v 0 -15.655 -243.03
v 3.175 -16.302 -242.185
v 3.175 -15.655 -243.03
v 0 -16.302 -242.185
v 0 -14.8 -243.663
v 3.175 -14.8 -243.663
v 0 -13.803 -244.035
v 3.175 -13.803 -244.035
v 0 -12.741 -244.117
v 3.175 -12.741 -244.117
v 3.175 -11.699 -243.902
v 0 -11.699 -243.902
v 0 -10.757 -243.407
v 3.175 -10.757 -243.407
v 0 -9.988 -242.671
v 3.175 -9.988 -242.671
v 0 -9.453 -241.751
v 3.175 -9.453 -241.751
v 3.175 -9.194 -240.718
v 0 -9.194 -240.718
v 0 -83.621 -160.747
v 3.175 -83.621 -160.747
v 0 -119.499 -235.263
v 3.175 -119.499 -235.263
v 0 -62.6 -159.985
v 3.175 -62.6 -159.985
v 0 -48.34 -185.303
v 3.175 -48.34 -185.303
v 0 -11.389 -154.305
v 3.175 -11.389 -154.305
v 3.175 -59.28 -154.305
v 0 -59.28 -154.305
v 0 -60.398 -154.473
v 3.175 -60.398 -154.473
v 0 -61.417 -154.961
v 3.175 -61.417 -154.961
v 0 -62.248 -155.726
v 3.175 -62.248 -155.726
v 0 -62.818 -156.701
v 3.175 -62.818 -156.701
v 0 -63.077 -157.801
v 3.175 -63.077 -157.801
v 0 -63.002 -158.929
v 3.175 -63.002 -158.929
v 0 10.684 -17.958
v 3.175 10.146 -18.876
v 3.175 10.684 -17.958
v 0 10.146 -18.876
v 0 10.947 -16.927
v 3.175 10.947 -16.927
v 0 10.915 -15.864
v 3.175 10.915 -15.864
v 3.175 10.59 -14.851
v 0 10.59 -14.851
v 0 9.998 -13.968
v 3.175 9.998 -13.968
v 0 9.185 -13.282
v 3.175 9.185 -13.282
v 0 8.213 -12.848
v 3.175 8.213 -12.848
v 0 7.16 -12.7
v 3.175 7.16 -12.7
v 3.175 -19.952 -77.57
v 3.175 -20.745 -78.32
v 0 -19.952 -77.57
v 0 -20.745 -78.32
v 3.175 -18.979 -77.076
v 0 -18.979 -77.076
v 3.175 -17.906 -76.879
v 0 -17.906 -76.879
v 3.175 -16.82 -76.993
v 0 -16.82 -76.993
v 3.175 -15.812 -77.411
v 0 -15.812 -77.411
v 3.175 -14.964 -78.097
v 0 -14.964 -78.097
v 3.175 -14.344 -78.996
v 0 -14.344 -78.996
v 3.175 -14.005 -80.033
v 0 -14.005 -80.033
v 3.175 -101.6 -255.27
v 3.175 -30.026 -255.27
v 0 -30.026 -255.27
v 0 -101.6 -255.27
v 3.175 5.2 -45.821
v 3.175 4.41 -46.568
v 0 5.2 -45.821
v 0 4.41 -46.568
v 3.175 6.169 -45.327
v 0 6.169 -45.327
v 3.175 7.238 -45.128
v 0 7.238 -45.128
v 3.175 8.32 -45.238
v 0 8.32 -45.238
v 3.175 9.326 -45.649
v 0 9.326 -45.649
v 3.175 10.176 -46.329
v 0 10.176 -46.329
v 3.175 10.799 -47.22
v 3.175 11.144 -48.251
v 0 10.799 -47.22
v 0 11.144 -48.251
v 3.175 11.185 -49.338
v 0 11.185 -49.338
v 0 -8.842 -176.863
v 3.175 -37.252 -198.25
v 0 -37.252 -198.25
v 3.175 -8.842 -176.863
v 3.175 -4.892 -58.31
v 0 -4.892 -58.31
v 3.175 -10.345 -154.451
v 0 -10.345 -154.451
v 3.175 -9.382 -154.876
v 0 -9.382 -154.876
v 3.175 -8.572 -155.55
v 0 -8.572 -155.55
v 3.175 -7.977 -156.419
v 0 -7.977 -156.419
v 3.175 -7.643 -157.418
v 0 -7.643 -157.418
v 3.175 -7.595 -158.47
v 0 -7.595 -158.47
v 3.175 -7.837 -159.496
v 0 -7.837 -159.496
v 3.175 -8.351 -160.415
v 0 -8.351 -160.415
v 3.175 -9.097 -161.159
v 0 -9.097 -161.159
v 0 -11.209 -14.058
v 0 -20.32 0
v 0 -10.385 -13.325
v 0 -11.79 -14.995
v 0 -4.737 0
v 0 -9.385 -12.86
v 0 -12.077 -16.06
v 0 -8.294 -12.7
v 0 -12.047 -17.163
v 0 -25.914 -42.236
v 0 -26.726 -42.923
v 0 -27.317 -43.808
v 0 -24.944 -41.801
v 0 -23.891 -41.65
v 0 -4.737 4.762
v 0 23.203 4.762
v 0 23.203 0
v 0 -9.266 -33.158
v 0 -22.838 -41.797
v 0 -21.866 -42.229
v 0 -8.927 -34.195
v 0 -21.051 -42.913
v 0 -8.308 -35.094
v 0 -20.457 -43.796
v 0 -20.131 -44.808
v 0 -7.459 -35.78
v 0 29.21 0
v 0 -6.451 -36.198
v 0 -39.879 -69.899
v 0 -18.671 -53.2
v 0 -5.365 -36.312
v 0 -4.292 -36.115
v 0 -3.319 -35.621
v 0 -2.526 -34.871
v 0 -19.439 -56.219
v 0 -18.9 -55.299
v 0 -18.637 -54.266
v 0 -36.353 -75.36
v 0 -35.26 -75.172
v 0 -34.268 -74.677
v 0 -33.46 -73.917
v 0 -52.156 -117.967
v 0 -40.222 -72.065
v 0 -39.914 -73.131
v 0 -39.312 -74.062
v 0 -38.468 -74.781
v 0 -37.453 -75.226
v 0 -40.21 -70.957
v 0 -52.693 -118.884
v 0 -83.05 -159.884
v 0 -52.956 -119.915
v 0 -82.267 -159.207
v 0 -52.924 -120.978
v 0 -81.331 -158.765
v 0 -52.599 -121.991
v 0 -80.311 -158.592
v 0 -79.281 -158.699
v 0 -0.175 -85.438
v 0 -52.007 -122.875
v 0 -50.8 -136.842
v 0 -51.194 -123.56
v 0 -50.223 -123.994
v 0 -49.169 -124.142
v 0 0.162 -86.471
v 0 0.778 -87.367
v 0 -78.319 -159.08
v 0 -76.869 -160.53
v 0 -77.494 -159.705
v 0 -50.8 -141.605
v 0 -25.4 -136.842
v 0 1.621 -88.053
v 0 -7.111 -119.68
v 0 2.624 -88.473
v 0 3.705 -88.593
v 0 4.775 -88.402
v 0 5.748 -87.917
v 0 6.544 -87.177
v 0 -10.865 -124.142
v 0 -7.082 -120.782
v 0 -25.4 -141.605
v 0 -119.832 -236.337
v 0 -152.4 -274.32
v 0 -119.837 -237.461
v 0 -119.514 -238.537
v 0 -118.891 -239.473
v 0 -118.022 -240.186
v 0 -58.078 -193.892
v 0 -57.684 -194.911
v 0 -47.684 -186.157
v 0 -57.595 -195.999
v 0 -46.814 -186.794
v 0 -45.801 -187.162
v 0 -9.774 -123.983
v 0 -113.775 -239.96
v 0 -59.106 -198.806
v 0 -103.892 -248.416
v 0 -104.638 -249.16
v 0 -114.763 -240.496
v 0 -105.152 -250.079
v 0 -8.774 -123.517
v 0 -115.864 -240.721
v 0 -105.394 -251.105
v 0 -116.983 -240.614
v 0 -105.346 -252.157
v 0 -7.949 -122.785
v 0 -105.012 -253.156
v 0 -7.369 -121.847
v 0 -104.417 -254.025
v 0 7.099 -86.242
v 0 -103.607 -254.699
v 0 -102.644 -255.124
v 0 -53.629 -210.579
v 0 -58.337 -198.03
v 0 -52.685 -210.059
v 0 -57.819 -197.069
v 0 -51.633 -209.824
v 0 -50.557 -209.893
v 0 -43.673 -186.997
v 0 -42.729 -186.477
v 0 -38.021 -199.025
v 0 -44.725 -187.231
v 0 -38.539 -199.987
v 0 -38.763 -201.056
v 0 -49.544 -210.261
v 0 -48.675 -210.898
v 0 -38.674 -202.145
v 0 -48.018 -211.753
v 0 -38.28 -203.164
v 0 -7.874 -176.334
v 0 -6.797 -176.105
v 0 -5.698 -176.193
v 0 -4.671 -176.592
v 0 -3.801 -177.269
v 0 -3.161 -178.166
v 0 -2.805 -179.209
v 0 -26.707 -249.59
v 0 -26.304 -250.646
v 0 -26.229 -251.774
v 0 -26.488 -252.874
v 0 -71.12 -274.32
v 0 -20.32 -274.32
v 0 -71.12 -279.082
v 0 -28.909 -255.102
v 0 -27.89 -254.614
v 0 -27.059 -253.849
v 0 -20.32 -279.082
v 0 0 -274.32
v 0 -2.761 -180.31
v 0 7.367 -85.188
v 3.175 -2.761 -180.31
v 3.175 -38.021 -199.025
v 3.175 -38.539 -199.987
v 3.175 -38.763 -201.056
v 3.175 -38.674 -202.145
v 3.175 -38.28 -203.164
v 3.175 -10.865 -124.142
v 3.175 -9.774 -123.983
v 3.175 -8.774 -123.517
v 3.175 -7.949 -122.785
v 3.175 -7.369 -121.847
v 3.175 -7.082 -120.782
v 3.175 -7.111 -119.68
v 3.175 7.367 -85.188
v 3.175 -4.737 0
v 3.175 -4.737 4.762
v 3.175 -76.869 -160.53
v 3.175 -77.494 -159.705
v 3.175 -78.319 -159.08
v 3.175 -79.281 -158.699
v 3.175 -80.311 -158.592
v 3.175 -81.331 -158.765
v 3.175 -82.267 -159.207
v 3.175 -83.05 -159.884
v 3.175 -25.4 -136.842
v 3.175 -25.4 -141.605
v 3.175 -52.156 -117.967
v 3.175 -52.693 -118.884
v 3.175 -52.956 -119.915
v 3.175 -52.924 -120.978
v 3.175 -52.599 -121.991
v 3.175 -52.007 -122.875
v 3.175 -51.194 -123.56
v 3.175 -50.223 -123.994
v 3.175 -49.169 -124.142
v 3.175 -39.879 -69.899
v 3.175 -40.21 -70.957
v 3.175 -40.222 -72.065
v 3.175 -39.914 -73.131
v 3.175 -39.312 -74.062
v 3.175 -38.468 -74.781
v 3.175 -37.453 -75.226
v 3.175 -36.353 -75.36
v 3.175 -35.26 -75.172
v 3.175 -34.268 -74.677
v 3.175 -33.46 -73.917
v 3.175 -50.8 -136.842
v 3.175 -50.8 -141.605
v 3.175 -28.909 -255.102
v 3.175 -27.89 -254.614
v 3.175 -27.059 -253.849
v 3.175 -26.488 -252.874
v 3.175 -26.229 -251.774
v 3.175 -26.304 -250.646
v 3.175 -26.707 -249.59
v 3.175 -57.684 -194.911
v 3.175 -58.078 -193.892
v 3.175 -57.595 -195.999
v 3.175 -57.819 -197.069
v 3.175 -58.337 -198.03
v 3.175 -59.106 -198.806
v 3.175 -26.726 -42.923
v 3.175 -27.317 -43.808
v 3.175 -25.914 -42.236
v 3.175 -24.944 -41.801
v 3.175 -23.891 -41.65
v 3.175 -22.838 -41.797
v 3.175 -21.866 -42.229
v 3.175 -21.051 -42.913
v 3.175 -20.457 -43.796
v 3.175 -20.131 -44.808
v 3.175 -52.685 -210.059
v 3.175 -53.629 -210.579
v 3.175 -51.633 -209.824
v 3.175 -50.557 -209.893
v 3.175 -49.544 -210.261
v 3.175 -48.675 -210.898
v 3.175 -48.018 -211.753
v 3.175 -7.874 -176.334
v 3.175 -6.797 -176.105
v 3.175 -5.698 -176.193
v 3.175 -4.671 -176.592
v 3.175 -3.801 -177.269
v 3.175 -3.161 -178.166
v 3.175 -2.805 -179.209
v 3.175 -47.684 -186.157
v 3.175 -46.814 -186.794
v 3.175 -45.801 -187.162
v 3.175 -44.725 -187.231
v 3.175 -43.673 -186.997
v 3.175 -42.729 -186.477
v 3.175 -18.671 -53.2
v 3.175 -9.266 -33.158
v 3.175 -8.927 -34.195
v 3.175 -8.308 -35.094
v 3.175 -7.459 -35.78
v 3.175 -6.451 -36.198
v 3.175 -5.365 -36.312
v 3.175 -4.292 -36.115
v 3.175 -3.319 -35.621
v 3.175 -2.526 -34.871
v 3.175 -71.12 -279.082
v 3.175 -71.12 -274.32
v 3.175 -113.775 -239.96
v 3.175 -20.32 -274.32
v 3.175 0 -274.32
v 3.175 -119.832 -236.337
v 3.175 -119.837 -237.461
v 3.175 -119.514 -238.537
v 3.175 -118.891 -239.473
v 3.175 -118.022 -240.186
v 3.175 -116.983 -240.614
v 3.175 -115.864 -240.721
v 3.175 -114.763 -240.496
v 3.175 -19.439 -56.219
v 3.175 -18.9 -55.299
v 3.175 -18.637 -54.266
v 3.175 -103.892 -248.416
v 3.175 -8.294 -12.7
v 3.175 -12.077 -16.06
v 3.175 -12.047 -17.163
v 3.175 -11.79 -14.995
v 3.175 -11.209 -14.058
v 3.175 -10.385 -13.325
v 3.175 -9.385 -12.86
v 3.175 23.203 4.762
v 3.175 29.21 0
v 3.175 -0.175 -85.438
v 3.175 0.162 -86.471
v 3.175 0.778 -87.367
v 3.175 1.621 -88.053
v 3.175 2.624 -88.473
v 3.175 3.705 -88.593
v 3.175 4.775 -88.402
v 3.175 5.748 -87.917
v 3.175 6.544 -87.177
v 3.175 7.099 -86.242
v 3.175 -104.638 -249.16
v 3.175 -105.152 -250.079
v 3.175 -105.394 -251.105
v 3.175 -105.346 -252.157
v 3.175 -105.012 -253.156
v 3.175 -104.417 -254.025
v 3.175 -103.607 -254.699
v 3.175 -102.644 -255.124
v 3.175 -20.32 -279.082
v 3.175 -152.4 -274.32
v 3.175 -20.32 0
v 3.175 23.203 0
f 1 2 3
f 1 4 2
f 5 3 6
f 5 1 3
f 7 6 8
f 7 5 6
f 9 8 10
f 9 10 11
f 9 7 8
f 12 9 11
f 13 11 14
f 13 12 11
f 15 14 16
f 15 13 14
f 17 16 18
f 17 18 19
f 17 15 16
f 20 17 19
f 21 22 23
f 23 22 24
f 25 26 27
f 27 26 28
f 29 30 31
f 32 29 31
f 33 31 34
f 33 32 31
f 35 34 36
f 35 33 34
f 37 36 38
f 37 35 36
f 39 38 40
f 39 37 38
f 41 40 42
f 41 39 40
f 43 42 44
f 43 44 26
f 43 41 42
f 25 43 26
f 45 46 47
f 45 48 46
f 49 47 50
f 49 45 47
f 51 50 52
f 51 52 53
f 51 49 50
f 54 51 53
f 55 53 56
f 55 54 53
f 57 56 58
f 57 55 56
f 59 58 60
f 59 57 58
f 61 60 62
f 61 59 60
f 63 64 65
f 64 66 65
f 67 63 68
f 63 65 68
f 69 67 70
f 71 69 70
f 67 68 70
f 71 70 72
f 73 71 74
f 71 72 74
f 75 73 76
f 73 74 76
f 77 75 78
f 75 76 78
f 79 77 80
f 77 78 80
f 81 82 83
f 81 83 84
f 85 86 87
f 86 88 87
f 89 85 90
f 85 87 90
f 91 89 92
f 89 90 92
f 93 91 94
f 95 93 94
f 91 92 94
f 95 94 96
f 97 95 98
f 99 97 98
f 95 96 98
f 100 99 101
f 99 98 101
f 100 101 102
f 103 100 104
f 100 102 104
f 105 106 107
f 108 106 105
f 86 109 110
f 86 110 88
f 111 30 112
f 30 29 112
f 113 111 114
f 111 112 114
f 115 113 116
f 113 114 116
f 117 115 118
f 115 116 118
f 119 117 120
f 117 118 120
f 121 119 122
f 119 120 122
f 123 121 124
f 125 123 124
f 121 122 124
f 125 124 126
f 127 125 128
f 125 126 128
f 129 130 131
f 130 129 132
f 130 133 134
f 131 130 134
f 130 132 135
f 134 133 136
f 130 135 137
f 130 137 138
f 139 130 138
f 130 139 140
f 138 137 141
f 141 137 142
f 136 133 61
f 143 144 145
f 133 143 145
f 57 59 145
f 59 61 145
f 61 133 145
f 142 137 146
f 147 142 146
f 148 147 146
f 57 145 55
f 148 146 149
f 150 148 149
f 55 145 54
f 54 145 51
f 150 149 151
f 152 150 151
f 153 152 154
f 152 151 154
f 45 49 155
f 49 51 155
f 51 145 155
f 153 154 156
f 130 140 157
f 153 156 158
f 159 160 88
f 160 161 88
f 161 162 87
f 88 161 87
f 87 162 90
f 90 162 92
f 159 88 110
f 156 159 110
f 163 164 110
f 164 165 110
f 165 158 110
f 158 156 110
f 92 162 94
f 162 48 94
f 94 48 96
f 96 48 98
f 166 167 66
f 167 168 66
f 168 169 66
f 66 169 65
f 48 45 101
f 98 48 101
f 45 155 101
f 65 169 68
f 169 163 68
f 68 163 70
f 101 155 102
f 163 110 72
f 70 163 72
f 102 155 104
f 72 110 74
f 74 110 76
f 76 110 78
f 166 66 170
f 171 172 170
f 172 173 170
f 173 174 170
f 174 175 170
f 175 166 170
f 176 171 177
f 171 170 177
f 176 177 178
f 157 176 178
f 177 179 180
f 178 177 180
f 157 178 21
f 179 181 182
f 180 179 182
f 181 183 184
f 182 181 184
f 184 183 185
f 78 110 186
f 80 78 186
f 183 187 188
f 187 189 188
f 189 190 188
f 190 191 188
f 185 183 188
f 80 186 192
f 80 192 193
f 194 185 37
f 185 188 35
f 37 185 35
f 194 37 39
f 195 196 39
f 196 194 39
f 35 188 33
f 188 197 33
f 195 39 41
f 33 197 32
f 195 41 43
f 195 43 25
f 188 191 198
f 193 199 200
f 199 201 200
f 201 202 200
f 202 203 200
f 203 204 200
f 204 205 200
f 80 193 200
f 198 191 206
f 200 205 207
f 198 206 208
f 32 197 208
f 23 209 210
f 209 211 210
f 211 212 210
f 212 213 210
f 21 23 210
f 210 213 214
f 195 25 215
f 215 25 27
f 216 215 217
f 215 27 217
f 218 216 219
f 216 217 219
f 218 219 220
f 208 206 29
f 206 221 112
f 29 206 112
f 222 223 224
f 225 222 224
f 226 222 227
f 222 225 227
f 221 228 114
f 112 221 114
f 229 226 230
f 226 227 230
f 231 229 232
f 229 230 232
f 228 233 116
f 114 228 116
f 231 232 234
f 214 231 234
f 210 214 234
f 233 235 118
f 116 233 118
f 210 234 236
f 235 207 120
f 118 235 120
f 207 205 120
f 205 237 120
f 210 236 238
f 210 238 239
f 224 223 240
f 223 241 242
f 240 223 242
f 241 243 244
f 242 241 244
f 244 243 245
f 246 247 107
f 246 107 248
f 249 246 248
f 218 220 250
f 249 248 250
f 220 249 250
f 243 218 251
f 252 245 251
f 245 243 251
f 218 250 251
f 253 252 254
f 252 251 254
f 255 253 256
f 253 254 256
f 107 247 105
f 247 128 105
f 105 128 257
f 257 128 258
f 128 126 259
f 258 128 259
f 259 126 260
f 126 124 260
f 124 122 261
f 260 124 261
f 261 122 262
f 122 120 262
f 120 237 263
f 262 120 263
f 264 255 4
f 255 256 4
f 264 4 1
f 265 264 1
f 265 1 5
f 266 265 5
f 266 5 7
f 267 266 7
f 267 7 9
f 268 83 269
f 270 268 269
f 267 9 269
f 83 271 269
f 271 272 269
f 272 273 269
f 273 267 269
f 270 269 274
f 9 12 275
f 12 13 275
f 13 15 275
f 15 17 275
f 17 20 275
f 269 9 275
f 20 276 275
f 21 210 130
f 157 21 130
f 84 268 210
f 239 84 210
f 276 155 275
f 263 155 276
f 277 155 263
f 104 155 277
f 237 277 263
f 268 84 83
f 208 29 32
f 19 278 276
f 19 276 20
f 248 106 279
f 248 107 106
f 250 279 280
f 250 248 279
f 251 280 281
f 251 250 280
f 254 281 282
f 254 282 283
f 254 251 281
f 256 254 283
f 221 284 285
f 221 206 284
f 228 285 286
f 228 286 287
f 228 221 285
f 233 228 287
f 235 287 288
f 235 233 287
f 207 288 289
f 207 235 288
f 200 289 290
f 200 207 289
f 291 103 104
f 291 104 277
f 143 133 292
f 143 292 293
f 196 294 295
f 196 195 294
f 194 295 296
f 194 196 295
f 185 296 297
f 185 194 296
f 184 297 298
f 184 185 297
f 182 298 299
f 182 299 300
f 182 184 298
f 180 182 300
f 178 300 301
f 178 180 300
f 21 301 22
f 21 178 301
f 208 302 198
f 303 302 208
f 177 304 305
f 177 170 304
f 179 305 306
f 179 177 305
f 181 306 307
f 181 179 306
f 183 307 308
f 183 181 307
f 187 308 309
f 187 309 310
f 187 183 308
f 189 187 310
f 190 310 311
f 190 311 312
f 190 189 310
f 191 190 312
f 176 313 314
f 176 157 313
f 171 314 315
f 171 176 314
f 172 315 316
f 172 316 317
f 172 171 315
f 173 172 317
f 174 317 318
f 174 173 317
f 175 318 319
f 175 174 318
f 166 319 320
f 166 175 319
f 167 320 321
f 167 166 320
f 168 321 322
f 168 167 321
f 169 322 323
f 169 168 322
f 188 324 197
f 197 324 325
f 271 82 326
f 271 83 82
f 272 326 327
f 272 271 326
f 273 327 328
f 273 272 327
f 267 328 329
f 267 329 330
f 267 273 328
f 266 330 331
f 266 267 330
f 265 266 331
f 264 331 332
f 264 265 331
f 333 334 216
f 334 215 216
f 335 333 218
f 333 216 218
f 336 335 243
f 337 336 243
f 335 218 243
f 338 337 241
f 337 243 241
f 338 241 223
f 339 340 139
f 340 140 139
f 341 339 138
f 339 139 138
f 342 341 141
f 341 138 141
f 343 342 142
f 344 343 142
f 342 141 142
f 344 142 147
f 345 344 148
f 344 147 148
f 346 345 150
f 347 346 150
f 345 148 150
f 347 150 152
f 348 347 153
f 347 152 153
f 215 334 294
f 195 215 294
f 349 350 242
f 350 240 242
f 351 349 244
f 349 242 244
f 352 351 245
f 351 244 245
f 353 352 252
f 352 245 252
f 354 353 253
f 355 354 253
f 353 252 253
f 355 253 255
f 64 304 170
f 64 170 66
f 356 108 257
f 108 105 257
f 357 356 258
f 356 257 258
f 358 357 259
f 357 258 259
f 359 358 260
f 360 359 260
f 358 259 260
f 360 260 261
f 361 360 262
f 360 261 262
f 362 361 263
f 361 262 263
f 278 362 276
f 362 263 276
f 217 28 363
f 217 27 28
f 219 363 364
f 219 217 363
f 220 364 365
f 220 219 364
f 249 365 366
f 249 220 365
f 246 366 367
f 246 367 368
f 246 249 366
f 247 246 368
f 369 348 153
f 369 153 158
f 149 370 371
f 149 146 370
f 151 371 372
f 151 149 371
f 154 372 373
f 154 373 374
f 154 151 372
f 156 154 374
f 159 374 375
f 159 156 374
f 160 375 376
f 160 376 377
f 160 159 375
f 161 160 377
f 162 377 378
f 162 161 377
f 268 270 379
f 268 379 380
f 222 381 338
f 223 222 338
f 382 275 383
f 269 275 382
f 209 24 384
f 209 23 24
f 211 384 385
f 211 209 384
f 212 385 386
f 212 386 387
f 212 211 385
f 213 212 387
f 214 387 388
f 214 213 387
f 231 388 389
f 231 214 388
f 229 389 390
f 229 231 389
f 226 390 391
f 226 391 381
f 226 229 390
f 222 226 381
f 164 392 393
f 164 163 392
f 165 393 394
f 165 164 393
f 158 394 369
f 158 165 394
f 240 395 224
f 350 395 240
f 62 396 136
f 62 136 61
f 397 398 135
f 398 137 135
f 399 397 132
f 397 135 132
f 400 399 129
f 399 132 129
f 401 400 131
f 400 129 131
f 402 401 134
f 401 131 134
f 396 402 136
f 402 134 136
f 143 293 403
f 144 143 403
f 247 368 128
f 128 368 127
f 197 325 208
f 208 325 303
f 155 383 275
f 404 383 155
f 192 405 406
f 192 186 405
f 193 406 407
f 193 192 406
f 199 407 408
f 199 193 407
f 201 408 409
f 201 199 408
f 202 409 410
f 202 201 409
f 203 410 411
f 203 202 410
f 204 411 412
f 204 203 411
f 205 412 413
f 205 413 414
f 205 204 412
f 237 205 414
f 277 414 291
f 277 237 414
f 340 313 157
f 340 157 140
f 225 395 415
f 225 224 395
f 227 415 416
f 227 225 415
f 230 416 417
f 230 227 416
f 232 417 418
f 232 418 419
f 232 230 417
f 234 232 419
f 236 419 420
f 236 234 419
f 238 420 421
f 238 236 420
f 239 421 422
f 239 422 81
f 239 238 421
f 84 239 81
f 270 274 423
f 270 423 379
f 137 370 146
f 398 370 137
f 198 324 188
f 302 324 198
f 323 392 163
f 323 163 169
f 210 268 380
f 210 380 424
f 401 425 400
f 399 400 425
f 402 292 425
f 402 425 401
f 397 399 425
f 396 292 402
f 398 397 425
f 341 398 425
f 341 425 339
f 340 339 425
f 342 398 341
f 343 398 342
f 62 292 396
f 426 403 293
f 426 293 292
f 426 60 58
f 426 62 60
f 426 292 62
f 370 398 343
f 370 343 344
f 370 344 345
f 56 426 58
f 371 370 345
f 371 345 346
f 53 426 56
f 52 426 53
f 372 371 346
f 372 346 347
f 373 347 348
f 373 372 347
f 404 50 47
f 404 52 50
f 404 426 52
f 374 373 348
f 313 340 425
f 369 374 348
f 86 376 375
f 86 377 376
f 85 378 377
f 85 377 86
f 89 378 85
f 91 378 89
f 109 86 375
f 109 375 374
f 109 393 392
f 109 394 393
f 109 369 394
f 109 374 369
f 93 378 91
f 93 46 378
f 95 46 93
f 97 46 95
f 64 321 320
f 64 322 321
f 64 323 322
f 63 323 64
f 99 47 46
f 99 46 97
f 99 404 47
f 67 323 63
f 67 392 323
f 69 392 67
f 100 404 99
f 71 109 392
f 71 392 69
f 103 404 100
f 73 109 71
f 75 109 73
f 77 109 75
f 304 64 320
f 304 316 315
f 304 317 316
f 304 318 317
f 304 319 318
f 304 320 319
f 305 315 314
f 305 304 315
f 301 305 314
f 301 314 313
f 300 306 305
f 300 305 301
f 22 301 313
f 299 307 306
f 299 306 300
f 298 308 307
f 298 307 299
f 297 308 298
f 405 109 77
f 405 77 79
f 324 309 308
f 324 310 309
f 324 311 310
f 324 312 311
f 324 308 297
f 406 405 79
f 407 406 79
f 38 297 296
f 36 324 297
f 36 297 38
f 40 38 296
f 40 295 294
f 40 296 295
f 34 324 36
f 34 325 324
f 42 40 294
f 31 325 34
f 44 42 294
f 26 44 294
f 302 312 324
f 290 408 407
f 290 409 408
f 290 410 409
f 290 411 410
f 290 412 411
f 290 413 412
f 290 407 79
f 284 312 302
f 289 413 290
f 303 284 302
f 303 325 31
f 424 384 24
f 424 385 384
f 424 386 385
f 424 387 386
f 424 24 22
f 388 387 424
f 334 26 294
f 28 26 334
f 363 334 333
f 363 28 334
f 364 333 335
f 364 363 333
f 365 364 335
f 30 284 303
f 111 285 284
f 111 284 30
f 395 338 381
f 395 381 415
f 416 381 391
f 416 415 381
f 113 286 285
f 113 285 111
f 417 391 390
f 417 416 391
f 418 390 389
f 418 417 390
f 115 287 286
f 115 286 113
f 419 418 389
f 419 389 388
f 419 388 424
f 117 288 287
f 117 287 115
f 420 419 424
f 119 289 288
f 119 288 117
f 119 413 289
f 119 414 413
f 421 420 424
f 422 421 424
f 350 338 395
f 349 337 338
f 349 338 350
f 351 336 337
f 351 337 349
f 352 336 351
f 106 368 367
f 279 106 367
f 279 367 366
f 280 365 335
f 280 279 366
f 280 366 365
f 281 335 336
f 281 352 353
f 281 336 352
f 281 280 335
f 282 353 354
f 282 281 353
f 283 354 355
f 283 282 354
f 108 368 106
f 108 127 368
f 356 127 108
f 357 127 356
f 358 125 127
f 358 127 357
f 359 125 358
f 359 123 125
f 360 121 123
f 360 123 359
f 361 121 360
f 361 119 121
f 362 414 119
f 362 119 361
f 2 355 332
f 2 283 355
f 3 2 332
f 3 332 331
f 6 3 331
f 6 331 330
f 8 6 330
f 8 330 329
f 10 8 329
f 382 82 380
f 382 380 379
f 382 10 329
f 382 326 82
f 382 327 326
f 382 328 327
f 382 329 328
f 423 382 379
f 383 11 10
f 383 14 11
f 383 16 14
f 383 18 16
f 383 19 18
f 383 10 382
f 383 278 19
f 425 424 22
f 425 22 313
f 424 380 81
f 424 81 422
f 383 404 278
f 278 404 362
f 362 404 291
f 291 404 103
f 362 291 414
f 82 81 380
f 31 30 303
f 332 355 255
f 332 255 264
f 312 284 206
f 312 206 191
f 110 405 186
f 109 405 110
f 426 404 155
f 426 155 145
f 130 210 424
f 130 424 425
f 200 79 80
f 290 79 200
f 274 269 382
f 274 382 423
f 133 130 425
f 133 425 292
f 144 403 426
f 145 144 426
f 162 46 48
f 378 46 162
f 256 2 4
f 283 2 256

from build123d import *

# Parameters (mm, degrees)
BOSS_EXTRUDE1_DEPTH = 3.175
SKETCH4_W           = 4.7625
SKETCH4_H           = 25.4
CUT_EXTRUDE1_DEPTH  = 318.998242812
BOSS_EXTRUDE2_DEPTH = 3.175
SKETCH8_W           = 4.7625
SKETCH8_H           = 25.4
BOSS_EXTRUDE3_DEPTH = 3.175
CUT_EXTRUDE2_DEPTH  = 3.175
FILLET1_R           = 3.81


with BuildPart() as part:
    # Sketch3 → Boss-Extrude1 (new body)
    with BuildSketch(Plane(origin=(0, 0, 0), x_dir=(0, 0, -1), z_dir=(1, 0, 0))):
        Polygon((0, 0), (274.32, 0), (274.32, -20.32), (279.0825, -20.32), (279.0825, -71.12), (274.32, -71.12), (274.32, -152.4), (0, -20.32), (0, -4.736956919), (-4.7625, -4.736956919), (-4.7625, -2.196956919), (0, -2.196956919), align=None)
    extrude(amount=BOSS_EXTRUDE1_DEPTH)

    # Sketch4 → Cut-Extrude1 (cut, through all)
    with BuildSketch(Plane(origin=(3.175, 0, 0), x_dir=(0, 0, -1), z_dir=(1, 0, 0))):
        with Locations((139.22375, -38.1)):
            Rectangle(SKETCH4_W, SKETCH4_H)
    extrude(amount=-CUT_EXTRUDE1_DEPTH, mode=Mode.SUBTRACT)

    # Sketch7 → Boss-Extrude2 (add)
    with BuildSketch(Plane(origin=(3.175, 0, 0), x_dir=(0, 0, -1), z_dir=(1, 0, 0))):
        Polygon((0, 0), (274.32, 0), (0, 29.21), align=None)
    extrude(amount=-BOSS_EXTRUDE2_DEPTH)

    # Sketch8 → Boss-Extrude3 (add)
    with BuildSketch(Plane(origin=(3.175, 0, 0), x_dir=(0, 0, -1), z_dir=(1, 0, 0))):
        with Locations((-2.38125, 10.503043081)):
            Rectangle(SKETCH8_W, SKETCH8_H)
    extrude(amount=-BOSS_EXTRUDE3_DEPTH)

    # Sketch9 → Cut-Extrude2 (cut)
    with BuildSketch(Plane(origin=(3.175, 0, 0), x_dir=(0, 0, -1), z_dir=(1, 0, 0))):
        Polygon((36.259032566, 12.577289188), (112.24402044, 4.486295109), (58.30952194, -4.892268607), align=None)
        Polygon((12.7, -12.823218546), (12.7, 15.039341432), (41.539031051, -7.808456237), align=None)
        Polygon((33.107422432, -22.165187422), (54.881369429, -18.378958664), (100.799344517, -54.757594352), align=None)
        Polygon((71.651860318, -15.462771034), (124.1425, -6.335277083), (124.1425, -57.048617412), align=None)
        Polygon((171.586571882, -1.832587683), (252.565242685, -10.455316519), (200.256550247, -39.917404217), align=None)
        Polygon((154.305, 0.007579693), (154.305, -65.798926774), (189.093407911, -46.204876971), align=None)
        Polygon((196.79890844, -56.44076101), (154.166437984, -80.452861577), (249.389029774, -126.300776142), align=None)
        Polygon((207.962050776, -50.153288256), (255.27, -23.507794287), (255.27, -112.996536471), align=None)
    extrude(amount=-CUT_EXTRUDE2_DEPTH, mode=Mode.SUBTRACT)

    # Fillet1
    fillet1_edges = [part.edges().sort_by_distance(p)[0] for p in [
        (1.5875, -65.798926774, -154.305),
        (1.5875, -46.204876971, -189.093407911),
        (1.5875, 0.007579693, -154.305),
        (1.5875, -6.335277083, -124.1425),
        (1.5875, -57.048617412, -124.1425),
        (1.5875, -15.462771034, -71.651860318),
        (1.5875, -18.378958664, -54.881369429),
        (1.5875, -54.757594352, -100.799344517),
        (1.5875, -22.165187422, -33.107422432),
        (1.5875, 4.486295109, -112.24402044),
        (1.5875, 12.577289188, -36.259032566),
        (1.5875, -80.452861577, -154.166437984),
        (1.5875, -126.300776142, -249.389029774),
        (1.5875, -56.44076101, -196.79890844),
        (1.5875, -10.455316519, -252.565242685),
        (1.5875, -39.917404217, -200.256550247),
        (1.5875, -1.832587683, -171.586571882),
        (1.5875, -23.507794287, -255.27),
        (1.5875, -112.996536471, -255.27),
        (1.5875, -50.153288256, -207.962050776),
        (1.5875, 15.039341432, -12.7),
        (1.5875, -7.808456237, -41.539031051),
        (1.5875, -12.823218546, -12.7),
    ]]
    fillet(fillet1_edges, radius=FILLET1_R)


solid = part.part
